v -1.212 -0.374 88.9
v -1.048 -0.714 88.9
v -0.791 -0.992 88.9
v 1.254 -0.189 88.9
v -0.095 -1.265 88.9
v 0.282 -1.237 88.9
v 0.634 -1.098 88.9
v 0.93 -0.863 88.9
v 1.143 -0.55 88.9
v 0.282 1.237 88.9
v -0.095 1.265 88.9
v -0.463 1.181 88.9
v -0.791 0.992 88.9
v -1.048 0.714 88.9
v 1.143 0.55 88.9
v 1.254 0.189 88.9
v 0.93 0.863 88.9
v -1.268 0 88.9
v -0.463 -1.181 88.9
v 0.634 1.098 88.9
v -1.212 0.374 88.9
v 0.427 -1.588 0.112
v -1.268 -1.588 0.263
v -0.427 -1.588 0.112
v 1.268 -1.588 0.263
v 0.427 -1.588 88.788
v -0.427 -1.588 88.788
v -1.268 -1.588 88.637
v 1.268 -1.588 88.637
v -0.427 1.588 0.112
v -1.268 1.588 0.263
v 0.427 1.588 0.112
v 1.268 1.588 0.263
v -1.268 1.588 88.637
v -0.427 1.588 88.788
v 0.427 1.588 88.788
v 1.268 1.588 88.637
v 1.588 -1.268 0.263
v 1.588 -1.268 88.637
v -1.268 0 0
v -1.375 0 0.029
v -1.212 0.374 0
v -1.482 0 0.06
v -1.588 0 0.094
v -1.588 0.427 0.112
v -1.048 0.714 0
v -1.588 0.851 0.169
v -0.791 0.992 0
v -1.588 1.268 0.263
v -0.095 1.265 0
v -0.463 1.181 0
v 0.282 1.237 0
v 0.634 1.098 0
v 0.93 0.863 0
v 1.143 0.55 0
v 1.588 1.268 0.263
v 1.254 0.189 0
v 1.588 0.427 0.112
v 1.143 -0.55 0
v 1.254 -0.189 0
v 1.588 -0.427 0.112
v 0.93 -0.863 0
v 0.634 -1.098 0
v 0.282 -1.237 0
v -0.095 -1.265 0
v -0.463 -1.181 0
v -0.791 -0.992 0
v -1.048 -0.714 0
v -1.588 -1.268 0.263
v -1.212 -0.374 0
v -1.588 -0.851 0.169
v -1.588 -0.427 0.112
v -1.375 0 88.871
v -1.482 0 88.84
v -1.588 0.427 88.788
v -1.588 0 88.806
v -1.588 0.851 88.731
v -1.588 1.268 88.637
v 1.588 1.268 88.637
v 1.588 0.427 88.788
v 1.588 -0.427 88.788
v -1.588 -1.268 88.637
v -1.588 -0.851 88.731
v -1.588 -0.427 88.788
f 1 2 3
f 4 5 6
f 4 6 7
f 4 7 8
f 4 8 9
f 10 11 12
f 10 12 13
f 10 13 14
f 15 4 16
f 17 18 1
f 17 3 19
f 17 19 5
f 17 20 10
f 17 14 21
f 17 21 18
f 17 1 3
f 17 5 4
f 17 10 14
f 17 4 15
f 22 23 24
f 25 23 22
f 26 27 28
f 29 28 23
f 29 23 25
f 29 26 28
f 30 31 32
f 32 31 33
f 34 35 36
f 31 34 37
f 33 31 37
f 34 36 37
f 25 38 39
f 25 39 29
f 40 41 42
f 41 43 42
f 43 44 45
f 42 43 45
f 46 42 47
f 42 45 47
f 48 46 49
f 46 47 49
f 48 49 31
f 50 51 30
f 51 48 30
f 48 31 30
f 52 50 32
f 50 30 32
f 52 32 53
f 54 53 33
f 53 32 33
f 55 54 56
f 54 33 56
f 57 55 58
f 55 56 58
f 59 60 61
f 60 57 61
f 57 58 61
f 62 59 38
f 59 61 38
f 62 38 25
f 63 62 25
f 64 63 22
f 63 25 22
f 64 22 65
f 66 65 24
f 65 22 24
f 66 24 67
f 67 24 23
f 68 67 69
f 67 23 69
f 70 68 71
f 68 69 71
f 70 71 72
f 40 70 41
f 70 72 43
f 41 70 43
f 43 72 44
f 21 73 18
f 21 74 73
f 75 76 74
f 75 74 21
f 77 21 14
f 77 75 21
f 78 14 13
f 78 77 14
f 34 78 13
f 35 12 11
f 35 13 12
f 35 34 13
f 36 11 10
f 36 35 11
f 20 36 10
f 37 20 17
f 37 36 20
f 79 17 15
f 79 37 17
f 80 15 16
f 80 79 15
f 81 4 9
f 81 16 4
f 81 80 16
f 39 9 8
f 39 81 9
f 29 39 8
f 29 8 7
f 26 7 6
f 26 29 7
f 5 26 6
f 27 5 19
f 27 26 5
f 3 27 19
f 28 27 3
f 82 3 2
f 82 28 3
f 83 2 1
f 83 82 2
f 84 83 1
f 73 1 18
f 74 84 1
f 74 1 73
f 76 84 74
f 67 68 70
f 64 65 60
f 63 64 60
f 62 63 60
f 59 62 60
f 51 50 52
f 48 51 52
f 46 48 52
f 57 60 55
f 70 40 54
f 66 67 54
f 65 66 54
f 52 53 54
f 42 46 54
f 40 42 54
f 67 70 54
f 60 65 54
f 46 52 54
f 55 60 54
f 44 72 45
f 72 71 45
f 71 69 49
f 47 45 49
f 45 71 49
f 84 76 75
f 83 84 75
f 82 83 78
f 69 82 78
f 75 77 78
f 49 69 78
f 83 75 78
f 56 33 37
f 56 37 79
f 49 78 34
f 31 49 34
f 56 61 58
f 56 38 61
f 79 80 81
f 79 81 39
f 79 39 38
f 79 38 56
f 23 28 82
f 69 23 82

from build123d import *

# Parameters (mm, degrees)
SKETCH1_W           = 3.175
SKETCH1_H           = 3.175
BOSS_EXTRUDE1_DEPTH = 44.45
SKETCH2_OUTSIDE_W   = 14.112
SKETCH2_OUTSIDE_H   = 14.111
SKETCH2_OUTSIDE_R   = 2.032
CUT_EXTRUDE1_DEPTH  = 45.45


with BuildPart() as part:
    # Sketch1 → Boss-Extrude1 (new body)
    with BuildSketch(Plane.XY):
        Rectangle(SKETCH1_W, SKETCH1_H)
    extrude(amount=BOSS_EXTRUDE1_DEPTH)

    # Sketch2 outside → Cut-Extrude1 (cut, through all)
    with BuildSketch(Plane(origin=(0, 0, 0), x_dir=(-1, 0, 0), z_dir=(0, 0, -1))):
        with Locations((0, -0.0005)):
            Rectangle(SKETCH2_OUTSIDE_W, SKETCH2_OUTSIDE_H)
        Circle(SKETCH2_OUTSIDE_R, mode=Mode.SUBTRACT)
    extrude(amount=-CUT_EXTRUDE1_DEPTH, mode=Mode.SUBTRACT)

    # Sketch3 → Cut-Revolve1 (revolve, cut)
    with BuildSketch(Plane(origin=(0, 0, 0), x_dir=(1, 0, 0), z_dir=(0, 1, 0))):
        with BuildLine():
            Line((-5.053685963, -4.40273269), (-5.053685963, 5.740530545))
            Line((-5.053685963, 5.740530545), (0, 5.740530545))
            Line((0, 5.740530545), (0, 0.160877736))
            ThreePointArc((0, 0.160877736), (-3.404639553, -1.148866368), (-5.053685963, -4.40273269))
        make_face()
    revolve(axis=Axis((0, 0, 44.45), (0, 0, -1)), mode=Mode.SUBTRACT)

    # Mirror1: part across plane


with BuildPart() as part_1:
    add(part.part)
    add(part.part.mirror(Plane(origin=(0, 0, 44.45), x_dir=(1, 0, 0), z_dir=(0, 0, -1))))


solid = part_1.part
